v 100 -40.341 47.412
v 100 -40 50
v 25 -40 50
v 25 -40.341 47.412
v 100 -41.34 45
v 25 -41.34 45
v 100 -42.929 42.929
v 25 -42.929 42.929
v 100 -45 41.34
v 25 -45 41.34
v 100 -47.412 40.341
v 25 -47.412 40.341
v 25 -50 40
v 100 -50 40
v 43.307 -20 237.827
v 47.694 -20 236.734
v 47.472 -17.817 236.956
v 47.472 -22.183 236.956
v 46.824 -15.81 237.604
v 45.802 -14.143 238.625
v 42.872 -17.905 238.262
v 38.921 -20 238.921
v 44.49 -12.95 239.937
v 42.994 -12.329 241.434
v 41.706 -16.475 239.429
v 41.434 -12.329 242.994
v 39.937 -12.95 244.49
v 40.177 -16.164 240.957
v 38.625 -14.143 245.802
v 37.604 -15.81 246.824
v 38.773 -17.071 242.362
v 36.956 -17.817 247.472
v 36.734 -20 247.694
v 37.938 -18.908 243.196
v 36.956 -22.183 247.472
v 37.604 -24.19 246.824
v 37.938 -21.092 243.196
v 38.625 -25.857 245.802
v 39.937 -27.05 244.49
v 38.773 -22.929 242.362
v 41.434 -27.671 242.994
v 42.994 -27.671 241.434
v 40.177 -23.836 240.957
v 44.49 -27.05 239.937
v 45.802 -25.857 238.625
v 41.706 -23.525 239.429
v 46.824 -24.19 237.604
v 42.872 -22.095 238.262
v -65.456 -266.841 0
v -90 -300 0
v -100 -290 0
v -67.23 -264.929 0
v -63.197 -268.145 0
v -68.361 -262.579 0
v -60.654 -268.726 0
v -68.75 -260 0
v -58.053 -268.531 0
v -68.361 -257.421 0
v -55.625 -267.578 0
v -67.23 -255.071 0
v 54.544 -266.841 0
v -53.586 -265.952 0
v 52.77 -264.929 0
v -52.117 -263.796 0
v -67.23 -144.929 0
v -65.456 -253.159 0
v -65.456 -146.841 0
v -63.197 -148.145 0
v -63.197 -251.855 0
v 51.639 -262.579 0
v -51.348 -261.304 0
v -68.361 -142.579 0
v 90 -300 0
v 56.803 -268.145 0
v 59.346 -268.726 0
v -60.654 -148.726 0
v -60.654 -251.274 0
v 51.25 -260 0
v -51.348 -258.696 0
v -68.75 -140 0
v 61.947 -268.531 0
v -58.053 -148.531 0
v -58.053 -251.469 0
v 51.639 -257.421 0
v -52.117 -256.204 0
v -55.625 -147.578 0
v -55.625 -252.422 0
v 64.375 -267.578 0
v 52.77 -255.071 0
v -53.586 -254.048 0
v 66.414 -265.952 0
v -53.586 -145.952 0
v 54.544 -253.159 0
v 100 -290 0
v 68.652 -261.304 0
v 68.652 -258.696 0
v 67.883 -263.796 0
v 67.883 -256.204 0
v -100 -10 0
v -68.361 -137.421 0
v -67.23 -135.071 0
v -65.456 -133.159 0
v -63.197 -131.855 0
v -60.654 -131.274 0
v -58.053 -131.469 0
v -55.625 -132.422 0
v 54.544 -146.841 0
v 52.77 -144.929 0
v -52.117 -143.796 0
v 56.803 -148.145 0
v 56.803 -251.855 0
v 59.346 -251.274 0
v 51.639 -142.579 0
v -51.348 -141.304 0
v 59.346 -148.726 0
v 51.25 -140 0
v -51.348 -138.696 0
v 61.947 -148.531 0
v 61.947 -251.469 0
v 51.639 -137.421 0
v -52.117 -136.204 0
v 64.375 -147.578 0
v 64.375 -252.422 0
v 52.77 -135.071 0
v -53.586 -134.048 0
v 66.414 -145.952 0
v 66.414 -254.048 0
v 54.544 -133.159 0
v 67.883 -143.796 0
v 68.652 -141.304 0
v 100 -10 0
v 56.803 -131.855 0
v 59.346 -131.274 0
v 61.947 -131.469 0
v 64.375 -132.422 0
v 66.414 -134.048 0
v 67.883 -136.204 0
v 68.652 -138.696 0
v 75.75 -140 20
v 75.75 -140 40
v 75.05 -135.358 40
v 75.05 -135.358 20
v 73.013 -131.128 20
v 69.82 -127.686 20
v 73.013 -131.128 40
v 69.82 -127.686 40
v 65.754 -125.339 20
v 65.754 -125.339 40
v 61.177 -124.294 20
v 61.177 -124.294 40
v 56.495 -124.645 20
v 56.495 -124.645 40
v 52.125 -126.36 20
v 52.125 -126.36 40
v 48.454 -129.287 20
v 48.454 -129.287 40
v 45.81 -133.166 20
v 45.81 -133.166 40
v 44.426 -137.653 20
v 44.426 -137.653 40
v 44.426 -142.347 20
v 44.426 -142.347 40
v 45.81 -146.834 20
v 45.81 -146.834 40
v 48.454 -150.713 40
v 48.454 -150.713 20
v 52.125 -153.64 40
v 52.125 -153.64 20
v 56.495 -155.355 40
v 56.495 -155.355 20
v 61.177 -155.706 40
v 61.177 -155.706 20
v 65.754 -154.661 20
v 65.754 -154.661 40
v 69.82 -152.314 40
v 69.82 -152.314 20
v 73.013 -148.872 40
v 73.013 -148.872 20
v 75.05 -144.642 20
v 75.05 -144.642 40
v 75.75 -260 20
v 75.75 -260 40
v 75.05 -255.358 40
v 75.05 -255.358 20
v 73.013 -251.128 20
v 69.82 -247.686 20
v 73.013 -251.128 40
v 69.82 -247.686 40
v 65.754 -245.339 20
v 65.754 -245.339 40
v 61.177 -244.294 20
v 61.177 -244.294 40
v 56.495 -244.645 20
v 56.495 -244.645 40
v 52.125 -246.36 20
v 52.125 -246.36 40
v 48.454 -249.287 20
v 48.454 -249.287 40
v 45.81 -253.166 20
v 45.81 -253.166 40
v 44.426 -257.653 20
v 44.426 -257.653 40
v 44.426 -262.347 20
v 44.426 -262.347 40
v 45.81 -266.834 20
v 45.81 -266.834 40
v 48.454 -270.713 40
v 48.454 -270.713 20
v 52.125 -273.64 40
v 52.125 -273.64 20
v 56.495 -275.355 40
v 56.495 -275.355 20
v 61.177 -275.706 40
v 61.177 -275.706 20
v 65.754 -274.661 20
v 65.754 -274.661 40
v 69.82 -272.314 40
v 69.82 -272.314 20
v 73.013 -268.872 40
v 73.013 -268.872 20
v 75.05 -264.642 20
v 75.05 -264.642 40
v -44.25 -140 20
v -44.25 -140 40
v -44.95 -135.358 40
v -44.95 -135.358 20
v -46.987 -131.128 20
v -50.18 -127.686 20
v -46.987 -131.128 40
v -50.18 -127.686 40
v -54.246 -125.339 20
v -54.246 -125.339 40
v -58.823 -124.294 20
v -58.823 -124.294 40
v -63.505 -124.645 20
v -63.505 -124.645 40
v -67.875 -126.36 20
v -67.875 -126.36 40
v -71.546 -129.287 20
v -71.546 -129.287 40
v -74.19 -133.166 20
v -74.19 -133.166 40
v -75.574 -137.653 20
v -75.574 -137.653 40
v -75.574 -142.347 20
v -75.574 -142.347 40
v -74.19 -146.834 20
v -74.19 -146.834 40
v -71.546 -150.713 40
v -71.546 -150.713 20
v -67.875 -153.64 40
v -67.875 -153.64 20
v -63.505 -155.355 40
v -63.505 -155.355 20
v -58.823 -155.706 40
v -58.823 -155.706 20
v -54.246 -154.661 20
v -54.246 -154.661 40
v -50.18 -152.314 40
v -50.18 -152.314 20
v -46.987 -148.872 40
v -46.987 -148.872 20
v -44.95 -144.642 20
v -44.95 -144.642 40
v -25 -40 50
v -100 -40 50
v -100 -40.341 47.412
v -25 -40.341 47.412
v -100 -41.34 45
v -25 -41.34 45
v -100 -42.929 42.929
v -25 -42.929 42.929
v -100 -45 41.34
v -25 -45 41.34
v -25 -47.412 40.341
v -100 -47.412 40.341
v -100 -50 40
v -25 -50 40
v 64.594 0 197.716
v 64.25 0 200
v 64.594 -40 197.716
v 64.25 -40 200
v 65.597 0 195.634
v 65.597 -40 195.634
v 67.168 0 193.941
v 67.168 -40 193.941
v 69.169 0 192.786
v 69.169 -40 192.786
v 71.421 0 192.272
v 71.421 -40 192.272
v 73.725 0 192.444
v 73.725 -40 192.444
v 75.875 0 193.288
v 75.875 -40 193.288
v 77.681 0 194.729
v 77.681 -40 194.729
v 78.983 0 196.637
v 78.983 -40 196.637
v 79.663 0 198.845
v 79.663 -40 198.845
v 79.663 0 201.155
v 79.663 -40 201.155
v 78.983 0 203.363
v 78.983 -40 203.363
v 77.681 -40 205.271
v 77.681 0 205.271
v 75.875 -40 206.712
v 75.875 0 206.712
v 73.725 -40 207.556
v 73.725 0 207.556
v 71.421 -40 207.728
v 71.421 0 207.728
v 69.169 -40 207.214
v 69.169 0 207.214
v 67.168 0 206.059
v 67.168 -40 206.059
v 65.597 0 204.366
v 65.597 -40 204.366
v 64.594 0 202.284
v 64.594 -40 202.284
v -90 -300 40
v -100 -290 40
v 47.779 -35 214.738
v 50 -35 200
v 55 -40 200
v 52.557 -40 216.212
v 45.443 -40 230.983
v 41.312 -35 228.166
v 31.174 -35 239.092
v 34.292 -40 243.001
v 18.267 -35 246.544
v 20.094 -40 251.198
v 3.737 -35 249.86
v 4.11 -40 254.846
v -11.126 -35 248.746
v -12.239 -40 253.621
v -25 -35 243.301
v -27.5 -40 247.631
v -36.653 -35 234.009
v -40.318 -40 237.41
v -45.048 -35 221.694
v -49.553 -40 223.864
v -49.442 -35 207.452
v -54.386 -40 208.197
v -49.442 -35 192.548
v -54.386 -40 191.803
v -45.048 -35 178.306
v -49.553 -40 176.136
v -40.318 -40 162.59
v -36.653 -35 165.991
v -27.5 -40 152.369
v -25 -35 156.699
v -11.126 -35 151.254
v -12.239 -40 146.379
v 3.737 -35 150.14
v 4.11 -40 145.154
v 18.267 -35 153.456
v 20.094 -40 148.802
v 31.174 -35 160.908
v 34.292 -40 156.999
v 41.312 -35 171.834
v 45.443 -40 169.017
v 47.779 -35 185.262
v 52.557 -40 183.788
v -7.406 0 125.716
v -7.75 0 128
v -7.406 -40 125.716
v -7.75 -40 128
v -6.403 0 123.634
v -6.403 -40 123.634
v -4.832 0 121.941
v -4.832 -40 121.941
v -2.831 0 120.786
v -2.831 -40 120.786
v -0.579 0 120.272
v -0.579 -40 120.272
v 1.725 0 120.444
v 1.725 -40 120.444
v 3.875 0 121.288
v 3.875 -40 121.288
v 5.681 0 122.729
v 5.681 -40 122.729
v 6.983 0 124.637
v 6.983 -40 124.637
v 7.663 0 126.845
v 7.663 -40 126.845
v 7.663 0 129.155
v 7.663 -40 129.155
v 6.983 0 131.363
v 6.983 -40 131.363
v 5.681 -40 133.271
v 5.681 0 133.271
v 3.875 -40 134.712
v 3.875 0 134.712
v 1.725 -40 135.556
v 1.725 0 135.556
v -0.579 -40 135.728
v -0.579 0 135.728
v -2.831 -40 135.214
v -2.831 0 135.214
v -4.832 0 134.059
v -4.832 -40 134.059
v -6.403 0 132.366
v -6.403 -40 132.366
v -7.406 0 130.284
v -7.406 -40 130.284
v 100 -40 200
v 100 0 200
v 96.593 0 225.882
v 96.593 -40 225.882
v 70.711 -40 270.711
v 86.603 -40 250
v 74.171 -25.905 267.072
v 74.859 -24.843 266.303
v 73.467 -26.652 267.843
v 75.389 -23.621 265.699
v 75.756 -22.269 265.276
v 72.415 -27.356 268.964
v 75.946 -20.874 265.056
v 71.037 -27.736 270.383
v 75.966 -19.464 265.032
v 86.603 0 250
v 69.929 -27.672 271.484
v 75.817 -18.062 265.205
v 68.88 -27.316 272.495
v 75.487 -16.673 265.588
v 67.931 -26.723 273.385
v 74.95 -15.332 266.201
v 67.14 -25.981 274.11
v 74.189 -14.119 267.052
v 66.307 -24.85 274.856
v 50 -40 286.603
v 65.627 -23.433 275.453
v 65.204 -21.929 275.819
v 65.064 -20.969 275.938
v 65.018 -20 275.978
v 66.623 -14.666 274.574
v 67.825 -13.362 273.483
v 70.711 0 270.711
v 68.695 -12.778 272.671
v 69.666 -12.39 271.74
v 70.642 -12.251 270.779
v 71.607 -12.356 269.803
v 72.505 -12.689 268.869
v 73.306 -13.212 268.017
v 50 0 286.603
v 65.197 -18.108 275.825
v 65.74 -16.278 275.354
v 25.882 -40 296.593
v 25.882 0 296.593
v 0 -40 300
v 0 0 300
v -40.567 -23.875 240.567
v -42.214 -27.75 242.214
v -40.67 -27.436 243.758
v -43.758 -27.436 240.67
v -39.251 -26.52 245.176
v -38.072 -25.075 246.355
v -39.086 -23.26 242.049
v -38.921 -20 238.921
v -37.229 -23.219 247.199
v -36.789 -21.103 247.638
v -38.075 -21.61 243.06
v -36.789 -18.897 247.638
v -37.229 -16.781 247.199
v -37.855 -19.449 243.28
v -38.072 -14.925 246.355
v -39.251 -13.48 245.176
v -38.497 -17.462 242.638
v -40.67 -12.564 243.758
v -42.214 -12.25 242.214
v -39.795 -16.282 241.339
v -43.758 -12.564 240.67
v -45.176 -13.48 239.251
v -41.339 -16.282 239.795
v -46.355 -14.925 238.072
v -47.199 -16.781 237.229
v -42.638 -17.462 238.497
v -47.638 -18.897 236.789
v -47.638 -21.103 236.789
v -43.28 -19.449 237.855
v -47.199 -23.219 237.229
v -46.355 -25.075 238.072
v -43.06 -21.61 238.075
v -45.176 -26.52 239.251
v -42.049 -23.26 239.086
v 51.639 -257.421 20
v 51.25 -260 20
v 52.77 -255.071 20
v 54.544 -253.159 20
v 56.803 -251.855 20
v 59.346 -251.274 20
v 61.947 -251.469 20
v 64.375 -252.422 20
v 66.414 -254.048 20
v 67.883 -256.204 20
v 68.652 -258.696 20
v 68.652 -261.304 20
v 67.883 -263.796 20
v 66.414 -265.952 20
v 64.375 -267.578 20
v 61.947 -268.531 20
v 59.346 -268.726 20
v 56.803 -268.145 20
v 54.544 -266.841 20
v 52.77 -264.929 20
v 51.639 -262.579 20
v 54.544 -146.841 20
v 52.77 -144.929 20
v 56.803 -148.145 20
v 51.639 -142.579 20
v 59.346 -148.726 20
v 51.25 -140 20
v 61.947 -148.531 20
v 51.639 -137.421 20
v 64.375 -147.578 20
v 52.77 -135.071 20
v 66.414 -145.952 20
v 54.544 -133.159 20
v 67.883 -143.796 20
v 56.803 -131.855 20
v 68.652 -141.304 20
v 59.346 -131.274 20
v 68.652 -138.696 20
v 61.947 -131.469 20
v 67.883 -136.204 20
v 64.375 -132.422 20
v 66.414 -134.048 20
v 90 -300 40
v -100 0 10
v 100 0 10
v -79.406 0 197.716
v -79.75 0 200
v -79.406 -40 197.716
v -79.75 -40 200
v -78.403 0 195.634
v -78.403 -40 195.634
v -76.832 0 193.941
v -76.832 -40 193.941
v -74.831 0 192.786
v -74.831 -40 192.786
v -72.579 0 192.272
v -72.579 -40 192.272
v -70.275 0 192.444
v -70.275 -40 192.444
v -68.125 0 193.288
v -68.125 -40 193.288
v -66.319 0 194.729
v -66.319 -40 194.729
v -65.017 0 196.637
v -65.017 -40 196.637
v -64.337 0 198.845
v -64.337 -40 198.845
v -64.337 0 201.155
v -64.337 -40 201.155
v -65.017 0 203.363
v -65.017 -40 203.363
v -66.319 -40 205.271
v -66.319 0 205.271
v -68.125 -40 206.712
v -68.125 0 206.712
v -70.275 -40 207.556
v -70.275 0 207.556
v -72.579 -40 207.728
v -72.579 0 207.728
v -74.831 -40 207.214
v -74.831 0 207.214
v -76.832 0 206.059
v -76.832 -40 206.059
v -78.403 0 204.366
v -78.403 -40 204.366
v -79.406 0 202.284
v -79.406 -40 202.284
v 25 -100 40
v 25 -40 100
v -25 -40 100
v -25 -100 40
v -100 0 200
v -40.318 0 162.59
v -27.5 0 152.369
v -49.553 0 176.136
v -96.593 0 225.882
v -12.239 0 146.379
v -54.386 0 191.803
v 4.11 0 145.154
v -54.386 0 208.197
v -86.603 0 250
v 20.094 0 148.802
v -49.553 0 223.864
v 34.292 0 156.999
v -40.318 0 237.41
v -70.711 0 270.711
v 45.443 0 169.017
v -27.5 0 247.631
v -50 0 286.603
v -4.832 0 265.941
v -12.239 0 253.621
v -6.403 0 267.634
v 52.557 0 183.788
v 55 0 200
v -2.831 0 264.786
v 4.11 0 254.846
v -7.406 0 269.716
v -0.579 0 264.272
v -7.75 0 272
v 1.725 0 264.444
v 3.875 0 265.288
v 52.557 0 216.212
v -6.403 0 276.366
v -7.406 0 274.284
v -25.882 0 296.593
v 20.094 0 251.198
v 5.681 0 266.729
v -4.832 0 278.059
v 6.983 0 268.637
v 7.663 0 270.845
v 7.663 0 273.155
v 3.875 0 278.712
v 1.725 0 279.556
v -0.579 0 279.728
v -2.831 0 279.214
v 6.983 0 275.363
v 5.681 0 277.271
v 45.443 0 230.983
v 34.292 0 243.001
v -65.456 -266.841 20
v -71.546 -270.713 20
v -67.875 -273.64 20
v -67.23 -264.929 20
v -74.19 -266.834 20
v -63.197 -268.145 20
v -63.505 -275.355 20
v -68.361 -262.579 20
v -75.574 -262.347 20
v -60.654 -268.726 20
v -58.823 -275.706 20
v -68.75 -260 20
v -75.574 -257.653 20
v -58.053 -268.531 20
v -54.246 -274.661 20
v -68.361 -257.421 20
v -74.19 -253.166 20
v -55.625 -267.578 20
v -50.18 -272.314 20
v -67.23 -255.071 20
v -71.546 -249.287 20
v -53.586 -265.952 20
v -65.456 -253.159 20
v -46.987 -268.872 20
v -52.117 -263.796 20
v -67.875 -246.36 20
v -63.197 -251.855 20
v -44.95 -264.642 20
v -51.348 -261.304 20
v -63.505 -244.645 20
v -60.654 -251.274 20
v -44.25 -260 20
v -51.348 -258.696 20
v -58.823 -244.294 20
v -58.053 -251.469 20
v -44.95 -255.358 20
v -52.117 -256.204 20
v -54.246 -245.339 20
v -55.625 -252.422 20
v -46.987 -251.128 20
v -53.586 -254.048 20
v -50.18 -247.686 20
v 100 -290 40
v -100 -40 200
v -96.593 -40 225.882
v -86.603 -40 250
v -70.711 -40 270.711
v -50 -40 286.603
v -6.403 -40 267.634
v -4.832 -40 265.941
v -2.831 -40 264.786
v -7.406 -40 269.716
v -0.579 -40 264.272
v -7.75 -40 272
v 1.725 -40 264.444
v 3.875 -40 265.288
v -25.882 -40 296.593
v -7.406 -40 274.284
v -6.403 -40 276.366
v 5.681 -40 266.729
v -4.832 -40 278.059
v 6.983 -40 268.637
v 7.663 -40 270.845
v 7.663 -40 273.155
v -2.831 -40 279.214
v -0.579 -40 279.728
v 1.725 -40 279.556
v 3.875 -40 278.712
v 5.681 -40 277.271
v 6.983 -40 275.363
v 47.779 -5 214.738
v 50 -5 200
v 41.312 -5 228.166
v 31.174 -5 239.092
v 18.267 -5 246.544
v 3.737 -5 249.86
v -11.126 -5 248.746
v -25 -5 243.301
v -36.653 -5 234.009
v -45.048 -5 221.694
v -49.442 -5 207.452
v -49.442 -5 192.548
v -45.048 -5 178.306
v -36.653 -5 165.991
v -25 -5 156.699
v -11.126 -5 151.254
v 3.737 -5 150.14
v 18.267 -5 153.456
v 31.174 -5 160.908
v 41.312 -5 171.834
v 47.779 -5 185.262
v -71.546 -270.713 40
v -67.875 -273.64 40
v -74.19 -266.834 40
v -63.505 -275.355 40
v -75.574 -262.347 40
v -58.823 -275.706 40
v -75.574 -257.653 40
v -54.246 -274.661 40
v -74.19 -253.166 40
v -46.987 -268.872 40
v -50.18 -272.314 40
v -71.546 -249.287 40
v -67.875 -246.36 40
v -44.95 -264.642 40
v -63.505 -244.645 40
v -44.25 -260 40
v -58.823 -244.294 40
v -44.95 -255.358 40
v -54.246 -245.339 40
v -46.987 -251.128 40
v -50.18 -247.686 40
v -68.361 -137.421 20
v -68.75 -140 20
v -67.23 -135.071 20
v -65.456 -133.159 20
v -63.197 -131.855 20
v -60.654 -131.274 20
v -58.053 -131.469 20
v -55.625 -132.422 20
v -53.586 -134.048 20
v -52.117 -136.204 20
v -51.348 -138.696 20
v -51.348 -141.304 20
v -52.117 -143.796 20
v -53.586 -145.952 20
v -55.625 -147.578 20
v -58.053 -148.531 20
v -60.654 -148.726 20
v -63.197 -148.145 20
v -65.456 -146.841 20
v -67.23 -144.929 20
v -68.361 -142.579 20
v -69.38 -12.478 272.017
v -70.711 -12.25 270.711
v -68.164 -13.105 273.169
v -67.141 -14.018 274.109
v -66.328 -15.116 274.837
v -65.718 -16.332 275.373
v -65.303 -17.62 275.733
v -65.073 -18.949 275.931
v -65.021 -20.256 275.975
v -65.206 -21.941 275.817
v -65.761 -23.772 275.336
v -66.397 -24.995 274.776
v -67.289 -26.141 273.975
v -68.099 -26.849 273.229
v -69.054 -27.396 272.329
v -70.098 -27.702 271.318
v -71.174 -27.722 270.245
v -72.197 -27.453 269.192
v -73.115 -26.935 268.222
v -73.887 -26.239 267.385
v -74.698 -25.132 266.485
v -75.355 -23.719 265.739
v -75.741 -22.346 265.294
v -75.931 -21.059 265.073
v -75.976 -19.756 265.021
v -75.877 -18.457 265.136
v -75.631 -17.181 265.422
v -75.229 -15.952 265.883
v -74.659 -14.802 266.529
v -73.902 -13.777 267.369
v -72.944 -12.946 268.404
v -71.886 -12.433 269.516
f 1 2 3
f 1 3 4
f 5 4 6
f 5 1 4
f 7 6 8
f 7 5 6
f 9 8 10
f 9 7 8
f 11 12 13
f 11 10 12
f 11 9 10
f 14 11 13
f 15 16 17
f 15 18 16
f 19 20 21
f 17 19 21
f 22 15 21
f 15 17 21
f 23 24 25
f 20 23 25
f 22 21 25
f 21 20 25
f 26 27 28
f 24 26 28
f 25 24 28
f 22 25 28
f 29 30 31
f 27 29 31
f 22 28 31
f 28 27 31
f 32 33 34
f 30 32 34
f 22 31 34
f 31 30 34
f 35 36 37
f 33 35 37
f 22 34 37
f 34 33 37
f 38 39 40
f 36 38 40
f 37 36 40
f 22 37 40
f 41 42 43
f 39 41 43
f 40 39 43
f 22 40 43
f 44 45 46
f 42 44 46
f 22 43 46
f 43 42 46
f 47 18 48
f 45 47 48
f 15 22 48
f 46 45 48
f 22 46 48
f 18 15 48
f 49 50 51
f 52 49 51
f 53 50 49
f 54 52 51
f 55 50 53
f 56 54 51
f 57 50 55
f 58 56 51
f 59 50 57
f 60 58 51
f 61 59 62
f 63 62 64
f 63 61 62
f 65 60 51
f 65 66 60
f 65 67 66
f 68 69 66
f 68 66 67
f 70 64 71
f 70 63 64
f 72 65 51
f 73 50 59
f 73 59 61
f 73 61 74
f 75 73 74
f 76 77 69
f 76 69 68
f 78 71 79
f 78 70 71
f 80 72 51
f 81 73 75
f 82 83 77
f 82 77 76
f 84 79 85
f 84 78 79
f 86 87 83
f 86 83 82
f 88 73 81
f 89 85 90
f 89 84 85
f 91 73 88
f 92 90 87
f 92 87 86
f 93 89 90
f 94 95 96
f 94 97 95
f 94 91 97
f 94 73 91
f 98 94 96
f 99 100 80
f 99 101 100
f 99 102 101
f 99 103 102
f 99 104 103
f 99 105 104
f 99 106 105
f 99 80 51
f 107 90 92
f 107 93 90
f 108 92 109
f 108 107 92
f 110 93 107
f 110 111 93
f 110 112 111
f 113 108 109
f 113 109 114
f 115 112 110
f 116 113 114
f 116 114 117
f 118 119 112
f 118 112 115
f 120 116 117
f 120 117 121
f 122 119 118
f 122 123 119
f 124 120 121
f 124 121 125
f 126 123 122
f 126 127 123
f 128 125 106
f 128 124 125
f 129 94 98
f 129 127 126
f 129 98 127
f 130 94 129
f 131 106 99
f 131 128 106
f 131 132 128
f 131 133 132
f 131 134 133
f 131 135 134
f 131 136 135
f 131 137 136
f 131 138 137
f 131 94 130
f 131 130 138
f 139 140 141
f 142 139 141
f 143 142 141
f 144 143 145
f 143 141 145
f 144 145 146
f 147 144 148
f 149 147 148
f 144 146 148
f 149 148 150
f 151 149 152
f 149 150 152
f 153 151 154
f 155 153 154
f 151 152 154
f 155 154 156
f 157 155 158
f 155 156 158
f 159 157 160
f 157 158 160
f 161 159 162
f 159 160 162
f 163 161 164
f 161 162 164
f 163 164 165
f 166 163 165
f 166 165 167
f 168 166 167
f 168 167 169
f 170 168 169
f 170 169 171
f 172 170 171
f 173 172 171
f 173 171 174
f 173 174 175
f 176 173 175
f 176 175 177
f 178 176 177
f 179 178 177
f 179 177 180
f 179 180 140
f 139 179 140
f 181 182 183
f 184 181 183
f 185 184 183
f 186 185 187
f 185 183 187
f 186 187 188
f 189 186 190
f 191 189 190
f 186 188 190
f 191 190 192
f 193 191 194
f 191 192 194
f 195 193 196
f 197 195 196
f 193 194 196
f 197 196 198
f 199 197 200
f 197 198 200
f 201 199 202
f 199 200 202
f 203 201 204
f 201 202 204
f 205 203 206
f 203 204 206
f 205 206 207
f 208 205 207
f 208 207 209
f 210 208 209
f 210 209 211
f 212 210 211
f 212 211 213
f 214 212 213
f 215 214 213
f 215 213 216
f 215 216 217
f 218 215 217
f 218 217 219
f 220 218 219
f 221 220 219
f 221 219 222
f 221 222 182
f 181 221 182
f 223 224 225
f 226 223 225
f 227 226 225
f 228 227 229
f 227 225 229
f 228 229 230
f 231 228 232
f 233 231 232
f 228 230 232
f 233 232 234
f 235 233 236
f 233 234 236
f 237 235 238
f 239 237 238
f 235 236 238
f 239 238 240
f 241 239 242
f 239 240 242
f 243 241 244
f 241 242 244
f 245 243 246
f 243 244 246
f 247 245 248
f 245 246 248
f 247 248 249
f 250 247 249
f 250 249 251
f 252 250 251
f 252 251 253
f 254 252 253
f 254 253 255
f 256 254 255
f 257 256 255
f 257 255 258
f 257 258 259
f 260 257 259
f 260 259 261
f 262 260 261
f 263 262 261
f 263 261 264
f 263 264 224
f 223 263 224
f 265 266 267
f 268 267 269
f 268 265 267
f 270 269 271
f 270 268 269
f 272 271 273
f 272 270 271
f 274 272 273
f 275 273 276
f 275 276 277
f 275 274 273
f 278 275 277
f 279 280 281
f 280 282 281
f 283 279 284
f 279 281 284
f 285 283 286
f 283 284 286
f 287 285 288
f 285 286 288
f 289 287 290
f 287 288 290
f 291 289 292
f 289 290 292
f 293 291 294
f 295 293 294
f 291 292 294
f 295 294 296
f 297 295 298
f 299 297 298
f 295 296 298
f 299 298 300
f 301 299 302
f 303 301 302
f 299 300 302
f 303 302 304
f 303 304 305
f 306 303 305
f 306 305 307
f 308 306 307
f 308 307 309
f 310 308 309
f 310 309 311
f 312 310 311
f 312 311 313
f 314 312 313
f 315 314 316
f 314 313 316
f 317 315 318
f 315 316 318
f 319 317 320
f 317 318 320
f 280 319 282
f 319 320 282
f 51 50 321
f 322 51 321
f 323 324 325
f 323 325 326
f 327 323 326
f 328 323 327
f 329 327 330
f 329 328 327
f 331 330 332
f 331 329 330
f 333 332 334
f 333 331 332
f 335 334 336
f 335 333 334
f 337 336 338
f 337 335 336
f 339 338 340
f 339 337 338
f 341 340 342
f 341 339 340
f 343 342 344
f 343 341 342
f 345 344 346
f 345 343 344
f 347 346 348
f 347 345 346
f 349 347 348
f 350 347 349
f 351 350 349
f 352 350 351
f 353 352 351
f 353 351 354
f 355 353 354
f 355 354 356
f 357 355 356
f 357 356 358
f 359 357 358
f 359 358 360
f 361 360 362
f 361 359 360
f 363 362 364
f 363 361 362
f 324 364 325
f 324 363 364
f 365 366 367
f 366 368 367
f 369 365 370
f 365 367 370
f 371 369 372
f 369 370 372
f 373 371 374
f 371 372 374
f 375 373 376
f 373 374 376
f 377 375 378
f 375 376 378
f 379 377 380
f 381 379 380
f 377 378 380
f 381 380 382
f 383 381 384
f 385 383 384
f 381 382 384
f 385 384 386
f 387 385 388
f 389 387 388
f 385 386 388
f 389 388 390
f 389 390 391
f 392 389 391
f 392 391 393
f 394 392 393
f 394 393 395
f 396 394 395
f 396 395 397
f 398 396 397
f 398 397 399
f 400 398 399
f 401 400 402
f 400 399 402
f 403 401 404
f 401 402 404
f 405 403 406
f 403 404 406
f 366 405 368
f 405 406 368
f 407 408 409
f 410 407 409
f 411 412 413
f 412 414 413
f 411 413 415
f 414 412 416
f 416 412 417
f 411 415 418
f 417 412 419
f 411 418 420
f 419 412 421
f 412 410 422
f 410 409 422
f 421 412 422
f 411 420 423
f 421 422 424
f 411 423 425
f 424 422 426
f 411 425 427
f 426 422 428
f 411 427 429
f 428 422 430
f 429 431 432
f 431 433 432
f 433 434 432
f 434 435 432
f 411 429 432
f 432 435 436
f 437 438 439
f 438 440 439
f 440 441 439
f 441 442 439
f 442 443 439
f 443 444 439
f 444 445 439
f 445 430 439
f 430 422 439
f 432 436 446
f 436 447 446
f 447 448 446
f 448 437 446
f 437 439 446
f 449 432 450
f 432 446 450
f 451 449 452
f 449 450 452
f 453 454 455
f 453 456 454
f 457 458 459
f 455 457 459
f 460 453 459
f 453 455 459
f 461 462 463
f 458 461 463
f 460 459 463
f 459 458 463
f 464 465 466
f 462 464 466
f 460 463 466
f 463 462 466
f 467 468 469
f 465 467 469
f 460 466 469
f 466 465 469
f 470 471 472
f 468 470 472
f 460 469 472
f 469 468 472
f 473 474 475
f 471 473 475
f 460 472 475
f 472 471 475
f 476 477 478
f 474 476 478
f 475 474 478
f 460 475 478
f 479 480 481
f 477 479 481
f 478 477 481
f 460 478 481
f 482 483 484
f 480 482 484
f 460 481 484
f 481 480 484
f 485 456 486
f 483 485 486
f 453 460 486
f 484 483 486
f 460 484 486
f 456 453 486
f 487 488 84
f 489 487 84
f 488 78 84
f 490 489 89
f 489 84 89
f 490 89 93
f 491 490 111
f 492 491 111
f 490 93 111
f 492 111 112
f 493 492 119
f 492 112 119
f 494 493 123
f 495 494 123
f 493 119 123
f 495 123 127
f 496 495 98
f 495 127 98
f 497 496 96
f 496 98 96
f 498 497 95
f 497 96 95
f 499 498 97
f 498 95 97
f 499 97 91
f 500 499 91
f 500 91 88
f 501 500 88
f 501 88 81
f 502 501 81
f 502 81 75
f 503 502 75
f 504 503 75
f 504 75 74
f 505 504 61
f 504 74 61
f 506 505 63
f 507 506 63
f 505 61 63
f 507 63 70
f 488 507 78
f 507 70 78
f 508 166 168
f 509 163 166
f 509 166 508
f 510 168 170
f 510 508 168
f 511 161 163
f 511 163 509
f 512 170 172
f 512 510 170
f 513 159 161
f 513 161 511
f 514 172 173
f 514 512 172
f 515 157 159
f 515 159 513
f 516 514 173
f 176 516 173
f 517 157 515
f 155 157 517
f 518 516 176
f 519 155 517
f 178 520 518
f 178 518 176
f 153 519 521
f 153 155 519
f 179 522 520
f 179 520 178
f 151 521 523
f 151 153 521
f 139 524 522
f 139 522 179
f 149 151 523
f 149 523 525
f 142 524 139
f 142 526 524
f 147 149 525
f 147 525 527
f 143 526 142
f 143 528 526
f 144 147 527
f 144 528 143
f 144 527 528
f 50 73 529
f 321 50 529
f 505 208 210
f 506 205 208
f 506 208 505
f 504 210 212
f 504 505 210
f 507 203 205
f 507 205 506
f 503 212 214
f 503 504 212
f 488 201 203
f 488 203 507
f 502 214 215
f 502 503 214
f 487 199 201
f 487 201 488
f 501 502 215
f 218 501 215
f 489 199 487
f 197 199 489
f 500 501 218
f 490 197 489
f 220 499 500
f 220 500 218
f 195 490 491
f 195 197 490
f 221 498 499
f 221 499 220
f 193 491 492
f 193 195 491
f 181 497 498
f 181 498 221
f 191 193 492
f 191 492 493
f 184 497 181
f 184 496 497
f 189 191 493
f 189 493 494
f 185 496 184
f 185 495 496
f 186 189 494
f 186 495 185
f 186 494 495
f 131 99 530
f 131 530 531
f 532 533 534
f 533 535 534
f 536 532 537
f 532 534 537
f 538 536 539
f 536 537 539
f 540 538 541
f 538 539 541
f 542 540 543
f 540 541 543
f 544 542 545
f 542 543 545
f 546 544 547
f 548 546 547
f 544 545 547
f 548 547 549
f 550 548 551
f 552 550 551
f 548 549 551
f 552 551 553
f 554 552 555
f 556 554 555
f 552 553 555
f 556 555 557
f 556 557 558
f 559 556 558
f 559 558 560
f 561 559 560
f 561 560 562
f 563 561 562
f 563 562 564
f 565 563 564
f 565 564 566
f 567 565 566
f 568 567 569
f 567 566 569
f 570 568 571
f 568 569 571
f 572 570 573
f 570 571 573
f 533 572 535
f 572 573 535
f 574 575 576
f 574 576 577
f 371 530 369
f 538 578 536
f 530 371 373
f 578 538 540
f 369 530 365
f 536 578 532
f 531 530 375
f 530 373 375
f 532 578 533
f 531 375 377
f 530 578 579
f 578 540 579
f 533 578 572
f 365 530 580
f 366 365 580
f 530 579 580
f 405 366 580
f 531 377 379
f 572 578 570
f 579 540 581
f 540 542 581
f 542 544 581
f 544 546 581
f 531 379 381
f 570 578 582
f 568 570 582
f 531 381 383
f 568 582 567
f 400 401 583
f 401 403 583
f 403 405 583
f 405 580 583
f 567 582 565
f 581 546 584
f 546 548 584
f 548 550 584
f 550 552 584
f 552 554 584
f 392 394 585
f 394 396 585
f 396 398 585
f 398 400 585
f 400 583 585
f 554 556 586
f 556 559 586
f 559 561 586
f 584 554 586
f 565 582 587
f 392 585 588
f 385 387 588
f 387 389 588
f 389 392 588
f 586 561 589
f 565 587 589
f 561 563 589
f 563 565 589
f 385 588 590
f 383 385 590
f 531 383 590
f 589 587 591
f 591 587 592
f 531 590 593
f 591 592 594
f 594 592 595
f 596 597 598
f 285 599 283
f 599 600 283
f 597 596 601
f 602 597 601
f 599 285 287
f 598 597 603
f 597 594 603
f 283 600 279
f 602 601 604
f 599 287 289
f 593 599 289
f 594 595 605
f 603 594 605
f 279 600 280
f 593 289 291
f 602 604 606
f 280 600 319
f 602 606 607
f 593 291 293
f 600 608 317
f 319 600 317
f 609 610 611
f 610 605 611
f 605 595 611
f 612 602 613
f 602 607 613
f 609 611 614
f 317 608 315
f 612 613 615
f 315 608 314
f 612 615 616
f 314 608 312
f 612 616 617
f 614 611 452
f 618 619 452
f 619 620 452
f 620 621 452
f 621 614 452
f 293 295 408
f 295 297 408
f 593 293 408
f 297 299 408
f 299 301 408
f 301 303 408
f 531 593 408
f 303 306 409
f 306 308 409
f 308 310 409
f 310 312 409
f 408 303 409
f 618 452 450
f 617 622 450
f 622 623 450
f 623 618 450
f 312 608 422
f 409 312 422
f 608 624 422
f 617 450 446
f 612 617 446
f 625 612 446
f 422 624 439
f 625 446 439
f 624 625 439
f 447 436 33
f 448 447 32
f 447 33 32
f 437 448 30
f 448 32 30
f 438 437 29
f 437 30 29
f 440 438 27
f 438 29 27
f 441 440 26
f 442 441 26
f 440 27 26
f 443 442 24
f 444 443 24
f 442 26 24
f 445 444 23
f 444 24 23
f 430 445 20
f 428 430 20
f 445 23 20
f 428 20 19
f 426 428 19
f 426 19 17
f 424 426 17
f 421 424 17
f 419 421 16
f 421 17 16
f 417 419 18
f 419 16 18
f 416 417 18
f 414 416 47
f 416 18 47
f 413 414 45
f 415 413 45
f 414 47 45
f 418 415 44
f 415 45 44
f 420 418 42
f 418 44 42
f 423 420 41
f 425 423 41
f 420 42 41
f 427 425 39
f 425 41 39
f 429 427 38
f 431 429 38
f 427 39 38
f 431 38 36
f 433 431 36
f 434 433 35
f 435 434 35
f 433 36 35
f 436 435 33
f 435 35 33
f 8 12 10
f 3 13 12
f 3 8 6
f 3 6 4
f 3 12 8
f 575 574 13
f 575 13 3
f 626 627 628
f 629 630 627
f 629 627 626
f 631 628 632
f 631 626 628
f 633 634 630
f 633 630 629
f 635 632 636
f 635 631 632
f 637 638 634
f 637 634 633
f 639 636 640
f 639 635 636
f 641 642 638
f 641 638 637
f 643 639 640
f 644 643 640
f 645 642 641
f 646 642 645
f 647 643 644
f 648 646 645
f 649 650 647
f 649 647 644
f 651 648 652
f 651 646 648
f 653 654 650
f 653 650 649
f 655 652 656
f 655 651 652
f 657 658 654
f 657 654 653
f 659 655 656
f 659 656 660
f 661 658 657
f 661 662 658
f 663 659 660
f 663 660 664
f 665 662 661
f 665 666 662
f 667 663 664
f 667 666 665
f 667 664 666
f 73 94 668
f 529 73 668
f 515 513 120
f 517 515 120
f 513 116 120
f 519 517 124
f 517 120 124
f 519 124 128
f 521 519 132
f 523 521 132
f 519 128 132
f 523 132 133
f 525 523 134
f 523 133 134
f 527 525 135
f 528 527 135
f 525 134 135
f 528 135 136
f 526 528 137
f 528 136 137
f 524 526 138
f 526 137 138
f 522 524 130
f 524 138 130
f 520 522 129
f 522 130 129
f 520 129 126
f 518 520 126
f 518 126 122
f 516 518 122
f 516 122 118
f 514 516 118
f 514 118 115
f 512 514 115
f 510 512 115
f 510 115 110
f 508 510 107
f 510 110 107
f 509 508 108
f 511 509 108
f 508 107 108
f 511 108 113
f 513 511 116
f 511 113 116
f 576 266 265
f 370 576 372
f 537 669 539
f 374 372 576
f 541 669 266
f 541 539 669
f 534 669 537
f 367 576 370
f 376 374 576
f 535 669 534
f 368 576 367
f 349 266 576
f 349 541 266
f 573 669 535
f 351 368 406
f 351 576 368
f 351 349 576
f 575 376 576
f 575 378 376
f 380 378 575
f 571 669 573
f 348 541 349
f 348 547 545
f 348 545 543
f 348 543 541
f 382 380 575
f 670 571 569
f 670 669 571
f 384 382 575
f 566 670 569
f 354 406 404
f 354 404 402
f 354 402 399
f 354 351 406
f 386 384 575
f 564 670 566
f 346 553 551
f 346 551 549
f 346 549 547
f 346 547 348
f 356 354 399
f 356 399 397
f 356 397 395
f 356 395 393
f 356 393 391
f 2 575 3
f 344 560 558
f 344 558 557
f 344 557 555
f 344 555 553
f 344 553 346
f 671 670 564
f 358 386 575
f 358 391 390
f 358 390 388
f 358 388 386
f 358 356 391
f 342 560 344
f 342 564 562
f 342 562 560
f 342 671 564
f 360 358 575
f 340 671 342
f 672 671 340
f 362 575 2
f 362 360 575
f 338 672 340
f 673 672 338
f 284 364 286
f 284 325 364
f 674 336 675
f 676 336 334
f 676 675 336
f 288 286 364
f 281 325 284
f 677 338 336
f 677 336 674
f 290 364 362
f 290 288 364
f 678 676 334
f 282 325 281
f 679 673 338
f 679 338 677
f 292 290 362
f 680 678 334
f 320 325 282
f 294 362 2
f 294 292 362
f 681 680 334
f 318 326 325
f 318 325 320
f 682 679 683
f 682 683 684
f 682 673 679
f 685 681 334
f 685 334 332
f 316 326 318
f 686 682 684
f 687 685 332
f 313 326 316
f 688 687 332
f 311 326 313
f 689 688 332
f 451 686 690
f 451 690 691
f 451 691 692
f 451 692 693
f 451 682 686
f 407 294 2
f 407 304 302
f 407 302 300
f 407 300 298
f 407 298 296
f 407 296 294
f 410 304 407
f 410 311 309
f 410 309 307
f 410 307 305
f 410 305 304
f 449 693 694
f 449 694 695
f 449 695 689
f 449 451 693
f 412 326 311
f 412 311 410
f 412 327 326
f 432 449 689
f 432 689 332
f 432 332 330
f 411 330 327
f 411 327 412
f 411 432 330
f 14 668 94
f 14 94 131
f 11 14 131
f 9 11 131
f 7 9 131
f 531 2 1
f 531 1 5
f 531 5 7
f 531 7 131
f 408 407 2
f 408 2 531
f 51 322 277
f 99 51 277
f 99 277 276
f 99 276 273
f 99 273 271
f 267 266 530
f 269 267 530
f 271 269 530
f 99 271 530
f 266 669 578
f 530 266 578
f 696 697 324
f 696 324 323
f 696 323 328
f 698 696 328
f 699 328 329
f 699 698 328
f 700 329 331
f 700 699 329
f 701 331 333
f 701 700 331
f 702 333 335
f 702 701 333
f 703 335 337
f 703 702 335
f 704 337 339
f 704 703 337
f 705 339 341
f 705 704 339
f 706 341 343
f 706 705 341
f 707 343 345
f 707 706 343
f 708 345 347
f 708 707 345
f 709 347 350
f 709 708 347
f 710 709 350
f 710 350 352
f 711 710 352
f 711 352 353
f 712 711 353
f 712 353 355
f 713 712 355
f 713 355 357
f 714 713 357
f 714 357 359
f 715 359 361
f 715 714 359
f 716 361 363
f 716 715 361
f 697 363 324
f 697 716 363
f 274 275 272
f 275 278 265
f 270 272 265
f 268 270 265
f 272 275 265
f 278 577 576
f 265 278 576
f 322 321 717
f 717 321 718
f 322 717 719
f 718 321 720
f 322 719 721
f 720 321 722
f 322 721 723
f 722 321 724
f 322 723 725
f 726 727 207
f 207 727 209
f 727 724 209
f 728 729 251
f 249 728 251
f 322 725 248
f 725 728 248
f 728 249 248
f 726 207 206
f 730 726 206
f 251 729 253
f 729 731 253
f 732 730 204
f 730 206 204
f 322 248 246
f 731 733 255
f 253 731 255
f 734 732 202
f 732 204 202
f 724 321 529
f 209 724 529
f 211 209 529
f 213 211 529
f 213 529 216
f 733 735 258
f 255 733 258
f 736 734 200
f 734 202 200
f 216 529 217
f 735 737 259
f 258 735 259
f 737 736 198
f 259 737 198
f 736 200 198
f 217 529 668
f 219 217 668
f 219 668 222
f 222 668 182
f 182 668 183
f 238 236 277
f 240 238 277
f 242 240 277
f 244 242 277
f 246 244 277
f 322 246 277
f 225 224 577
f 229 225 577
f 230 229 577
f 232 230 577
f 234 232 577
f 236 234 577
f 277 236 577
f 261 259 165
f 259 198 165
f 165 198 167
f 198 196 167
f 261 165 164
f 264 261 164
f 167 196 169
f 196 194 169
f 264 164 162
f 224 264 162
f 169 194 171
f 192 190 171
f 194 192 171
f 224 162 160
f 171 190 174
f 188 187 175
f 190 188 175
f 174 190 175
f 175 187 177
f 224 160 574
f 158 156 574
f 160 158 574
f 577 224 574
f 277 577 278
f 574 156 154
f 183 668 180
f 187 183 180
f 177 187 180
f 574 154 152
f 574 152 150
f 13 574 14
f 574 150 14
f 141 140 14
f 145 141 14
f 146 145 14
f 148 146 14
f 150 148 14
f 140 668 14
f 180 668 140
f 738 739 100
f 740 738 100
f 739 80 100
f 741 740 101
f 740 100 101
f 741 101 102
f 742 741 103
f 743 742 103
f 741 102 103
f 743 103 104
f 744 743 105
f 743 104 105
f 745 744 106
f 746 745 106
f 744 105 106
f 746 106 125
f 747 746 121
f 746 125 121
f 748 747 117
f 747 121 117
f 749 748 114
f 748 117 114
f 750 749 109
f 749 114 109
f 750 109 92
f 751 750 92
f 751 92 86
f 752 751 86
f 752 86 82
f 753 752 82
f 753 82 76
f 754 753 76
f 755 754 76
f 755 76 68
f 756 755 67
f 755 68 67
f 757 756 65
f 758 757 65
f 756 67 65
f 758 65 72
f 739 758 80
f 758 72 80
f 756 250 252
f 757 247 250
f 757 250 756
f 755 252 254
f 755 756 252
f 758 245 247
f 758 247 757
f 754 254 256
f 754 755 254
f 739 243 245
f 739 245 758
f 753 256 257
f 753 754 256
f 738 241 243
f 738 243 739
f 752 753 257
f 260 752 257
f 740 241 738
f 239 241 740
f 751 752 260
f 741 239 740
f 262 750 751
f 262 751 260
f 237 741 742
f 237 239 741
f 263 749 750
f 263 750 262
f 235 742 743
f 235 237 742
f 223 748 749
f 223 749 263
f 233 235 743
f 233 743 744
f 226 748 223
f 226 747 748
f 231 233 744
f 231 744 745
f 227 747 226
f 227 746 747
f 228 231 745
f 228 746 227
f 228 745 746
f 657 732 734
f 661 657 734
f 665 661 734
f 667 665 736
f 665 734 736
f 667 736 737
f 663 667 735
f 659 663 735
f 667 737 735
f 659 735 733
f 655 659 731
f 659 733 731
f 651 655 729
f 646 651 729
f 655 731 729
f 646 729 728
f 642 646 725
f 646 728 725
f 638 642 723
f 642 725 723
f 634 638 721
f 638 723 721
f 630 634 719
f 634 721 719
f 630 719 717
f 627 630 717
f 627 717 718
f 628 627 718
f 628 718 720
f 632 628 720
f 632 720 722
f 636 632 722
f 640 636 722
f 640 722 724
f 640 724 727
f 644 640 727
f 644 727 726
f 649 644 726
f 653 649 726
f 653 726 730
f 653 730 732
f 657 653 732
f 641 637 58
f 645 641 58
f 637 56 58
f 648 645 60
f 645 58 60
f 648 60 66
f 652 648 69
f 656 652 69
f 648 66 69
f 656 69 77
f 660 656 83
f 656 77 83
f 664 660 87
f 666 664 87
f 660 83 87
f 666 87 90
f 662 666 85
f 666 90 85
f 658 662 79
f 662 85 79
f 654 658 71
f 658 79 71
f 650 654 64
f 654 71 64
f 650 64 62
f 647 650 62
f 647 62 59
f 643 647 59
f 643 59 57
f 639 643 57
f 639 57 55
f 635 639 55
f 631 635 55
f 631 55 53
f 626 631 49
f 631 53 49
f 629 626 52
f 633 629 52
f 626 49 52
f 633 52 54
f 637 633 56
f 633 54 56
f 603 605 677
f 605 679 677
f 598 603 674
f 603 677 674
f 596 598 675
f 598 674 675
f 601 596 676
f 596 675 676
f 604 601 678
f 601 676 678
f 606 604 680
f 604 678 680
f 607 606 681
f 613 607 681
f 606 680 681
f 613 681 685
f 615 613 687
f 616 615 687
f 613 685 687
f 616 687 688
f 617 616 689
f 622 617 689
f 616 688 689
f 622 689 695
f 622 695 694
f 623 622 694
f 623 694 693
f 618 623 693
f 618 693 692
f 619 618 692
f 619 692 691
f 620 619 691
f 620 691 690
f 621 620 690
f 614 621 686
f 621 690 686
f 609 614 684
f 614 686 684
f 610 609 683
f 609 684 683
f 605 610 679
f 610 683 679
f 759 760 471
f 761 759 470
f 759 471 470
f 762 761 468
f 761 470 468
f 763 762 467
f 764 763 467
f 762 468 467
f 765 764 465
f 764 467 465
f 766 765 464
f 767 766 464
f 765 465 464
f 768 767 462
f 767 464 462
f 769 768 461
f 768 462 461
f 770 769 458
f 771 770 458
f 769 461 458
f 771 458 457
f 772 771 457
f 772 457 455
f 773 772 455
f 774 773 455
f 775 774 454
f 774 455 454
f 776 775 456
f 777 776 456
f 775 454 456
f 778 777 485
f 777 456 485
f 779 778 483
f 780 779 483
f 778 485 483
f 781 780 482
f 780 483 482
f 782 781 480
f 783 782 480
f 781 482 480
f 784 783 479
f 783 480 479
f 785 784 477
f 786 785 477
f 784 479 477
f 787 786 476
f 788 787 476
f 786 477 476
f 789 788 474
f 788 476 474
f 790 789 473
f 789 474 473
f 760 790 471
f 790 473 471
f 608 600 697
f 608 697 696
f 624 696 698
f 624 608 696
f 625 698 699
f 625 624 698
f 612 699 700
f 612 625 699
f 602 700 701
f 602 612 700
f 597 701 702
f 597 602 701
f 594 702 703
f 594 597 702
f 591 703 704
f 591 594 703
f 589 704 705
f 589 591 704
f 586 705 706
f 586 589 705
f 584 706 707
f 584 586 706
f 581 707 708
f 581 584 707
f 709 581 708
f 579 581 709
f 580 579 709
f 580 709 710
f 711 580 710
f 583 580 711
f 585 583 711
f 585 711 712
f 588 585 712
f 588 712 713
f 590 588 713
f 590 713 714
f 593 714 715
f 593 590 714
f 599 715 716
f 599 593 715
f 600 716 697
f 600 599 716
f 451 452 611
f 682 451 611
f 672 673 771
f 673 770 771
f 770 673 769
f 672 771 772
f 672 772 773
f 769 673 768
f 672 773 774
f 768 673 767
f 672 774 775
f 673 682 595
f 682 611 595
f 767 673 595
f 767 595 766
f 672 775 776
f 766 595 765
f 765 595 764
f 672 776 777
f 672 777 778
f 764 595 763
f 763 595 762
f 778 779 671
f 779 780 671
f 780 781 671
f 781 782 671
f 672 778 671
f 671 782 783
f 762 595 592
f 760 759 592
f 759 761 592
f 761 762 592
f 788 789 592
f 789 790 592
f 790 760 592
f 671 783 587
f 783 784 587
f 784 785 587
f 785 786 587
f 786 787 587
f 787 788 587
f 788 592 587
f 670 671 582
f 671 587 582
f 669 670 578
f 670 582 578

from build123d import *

# Parameters (mm, degrees)
F0_R            = 7.5770017359
F0_R_2          = 50
F1_DEPTH        = 40
F2_D            = 15.5
F2_DEPTH        = 40
F2_TIP          = 4.6566697975
F3_SIZE         = 5
F9_D            = 15.5
F9_DEPTH        = 40
F9_START        = 0.3007649
F9_TIP          = 4.6566697975
F11_D           = 15.5
F11_DEPTH       = 40
F11_START       = 0.3007649
F11_TIP         = 4.6566697975
F12_W           = 300
F12_H           = 40
F13_DEPTH       = 100
F15_R           = 10
F16_DEPTH       = 25
F17_SIZE        = 10
F19_D           = 17.5
F19_CBORE_D     = 31.5
F19_CBORE_DEPTH = 20


with BuildPart() as f1:
    # F0 (on Front) → F1 (new body)
    with BuildSketch(Plane.XZ):
        with BuildLine():
            Line((-100, 200), (-100, 0))
            Line((-100, 0), (100, 0))
            Line((100, 0), (100, 200))
            ThreePointArc((100, 200), (70.7106781187, 270.7106781187), (0, 300))
            ThreePointArc((0, 300), (-70.7106781187, 270.7106781187), (-100, 200))
        make_face()
        with Locations((0, 128)):
            Circle(F0_R, mode=Mode.SUBTRACT)
        with Locations((-72, 200)):
            Circle(F0_R, mode=Mode.SUBTRACT)
        with Locations((0, 200)):
            Circle(F0_R_2, mode=Mode.SUBTRACT)
        with Locations((72, 200)):
            Circle(F0_R, mode=Mode.SUBTRACT)
        with Locations((0, 272)):
            Circle(F0_R, mode=Mode.SUBTRACT)
        with Locations((72, 200)):
            Circle(F0_R)
        with Locations((0, 128)):
            Circle(F0_R)
        with Locations((-72, 200)):
            Circle(F0_R)
        with Locations((0, 272)):
            Circle(F0_R)
    extrude(amount=F1_DEPTH)

    # F2
    with Locations(Plane(origin=(0, 0, 0), x_dir=(1, 0, 0), z_dir=(0, 1, 0))):
        with Locations((0, -272), (72, -200), (0, -128), (-72, -200)):
            Hole(F2_D / 2, depth=F2_DEPTH)
            with Locations((0, 0, -(F2_DEPTH + F2_TIP / 2))):  # 118° drill point
                Cone(0, F2_D / 2, F2_TIP, mode=Mode.SUBTRACT)

    # F3
    f3_edges = [f1.edges().sort_by_distance(p)[0] for p in [
        (-50, 0, 200),
        (-50, -40, 200),
    ]]
    chamfer(f3_edges, length=F3_SIZE)

    # F9
    # its depths count from where the whole tool has entered the part; down to there all is cleared
    with Locations(Plane(origin=(170.7106781187, 0, 170.7106781187), x_dir=(0.7071067812, 0, -0.7071067812), z_dir=(0.7071067812, 0, 0.7071067812)).offset(-F9_START)):
        with Locations((-141.4213562373, -20)):
            Hole(F9_D / 2, depth=F9_DEPTH)
            with Locations((0, 0, -(F9_DEPTH + F9_TIP / 2))):  # 118° drill point
                Cone(0, F9_D / 2, F9_TIP, mode=Mode.SUBTRACT)

    # F11
    # its depths count from where the whole tool has entered the part; down to there all is cleared
    with Locations(Plane(origin=(-170.7106781187, 0, 170.7106781187), x_dir=(0, -1, 0), z_dir=(-0.7071067812, 0, 0.7071067812)).offset(-F11_START)):
        with Locations((20, 141.4213562373)):
            Hole(F11_D / 2, depth=F11_DEPTH)
            with Locations((0, 0, -(F11_DEPTH + F11_TIP / 2))):  # 118° drill point
                Cone(0, F11_D / 2, F11_TIP, mode=Mode.SUBTRACT)

    # F12 (on Right) → F13 (join, symmetric)
    with BuildSketch(Plane.YZ):
        with Locations((-150, 20)):
            Rectangle(F12_W, F12_H)
    extrude(amount=F13_DEPTH, both=True)

    # F15
    f15_edges = [f1.edges().sort_by_distance(p)[0] for p in [
        (0, -40, 40),
    ]]
    fillet(f15_edges, radius=F15_R)

    # F14 (on Right) → F16 (join, symmetric)
    with BuildSketch(Plane.YZ):
        Polygon((-40, 40), (-40, 100), (-100, 40), align=None)
    extrude(amount=F16_DEPTH, both=True)

    # F17
    f17_edges = [f1.edges().sort_by_distance(p)[0] for p in [
        (100, -300, 20),
        (-100, -300, 20),
        (0, 0, 0),
    ]]
    chamfer(f17_edges, length=F17_SIZE)

    # F19 (through all)
    with Locations(Plane.XY.offset(40)):
        with Locations((-60, -140), (60, -140), (60, -260), (-60, -260)):
            CounterBoreHole(F19_D / 2, F19_CBORE_D / 2, F19_CBORE_DEPTH)


solid = f1.part
